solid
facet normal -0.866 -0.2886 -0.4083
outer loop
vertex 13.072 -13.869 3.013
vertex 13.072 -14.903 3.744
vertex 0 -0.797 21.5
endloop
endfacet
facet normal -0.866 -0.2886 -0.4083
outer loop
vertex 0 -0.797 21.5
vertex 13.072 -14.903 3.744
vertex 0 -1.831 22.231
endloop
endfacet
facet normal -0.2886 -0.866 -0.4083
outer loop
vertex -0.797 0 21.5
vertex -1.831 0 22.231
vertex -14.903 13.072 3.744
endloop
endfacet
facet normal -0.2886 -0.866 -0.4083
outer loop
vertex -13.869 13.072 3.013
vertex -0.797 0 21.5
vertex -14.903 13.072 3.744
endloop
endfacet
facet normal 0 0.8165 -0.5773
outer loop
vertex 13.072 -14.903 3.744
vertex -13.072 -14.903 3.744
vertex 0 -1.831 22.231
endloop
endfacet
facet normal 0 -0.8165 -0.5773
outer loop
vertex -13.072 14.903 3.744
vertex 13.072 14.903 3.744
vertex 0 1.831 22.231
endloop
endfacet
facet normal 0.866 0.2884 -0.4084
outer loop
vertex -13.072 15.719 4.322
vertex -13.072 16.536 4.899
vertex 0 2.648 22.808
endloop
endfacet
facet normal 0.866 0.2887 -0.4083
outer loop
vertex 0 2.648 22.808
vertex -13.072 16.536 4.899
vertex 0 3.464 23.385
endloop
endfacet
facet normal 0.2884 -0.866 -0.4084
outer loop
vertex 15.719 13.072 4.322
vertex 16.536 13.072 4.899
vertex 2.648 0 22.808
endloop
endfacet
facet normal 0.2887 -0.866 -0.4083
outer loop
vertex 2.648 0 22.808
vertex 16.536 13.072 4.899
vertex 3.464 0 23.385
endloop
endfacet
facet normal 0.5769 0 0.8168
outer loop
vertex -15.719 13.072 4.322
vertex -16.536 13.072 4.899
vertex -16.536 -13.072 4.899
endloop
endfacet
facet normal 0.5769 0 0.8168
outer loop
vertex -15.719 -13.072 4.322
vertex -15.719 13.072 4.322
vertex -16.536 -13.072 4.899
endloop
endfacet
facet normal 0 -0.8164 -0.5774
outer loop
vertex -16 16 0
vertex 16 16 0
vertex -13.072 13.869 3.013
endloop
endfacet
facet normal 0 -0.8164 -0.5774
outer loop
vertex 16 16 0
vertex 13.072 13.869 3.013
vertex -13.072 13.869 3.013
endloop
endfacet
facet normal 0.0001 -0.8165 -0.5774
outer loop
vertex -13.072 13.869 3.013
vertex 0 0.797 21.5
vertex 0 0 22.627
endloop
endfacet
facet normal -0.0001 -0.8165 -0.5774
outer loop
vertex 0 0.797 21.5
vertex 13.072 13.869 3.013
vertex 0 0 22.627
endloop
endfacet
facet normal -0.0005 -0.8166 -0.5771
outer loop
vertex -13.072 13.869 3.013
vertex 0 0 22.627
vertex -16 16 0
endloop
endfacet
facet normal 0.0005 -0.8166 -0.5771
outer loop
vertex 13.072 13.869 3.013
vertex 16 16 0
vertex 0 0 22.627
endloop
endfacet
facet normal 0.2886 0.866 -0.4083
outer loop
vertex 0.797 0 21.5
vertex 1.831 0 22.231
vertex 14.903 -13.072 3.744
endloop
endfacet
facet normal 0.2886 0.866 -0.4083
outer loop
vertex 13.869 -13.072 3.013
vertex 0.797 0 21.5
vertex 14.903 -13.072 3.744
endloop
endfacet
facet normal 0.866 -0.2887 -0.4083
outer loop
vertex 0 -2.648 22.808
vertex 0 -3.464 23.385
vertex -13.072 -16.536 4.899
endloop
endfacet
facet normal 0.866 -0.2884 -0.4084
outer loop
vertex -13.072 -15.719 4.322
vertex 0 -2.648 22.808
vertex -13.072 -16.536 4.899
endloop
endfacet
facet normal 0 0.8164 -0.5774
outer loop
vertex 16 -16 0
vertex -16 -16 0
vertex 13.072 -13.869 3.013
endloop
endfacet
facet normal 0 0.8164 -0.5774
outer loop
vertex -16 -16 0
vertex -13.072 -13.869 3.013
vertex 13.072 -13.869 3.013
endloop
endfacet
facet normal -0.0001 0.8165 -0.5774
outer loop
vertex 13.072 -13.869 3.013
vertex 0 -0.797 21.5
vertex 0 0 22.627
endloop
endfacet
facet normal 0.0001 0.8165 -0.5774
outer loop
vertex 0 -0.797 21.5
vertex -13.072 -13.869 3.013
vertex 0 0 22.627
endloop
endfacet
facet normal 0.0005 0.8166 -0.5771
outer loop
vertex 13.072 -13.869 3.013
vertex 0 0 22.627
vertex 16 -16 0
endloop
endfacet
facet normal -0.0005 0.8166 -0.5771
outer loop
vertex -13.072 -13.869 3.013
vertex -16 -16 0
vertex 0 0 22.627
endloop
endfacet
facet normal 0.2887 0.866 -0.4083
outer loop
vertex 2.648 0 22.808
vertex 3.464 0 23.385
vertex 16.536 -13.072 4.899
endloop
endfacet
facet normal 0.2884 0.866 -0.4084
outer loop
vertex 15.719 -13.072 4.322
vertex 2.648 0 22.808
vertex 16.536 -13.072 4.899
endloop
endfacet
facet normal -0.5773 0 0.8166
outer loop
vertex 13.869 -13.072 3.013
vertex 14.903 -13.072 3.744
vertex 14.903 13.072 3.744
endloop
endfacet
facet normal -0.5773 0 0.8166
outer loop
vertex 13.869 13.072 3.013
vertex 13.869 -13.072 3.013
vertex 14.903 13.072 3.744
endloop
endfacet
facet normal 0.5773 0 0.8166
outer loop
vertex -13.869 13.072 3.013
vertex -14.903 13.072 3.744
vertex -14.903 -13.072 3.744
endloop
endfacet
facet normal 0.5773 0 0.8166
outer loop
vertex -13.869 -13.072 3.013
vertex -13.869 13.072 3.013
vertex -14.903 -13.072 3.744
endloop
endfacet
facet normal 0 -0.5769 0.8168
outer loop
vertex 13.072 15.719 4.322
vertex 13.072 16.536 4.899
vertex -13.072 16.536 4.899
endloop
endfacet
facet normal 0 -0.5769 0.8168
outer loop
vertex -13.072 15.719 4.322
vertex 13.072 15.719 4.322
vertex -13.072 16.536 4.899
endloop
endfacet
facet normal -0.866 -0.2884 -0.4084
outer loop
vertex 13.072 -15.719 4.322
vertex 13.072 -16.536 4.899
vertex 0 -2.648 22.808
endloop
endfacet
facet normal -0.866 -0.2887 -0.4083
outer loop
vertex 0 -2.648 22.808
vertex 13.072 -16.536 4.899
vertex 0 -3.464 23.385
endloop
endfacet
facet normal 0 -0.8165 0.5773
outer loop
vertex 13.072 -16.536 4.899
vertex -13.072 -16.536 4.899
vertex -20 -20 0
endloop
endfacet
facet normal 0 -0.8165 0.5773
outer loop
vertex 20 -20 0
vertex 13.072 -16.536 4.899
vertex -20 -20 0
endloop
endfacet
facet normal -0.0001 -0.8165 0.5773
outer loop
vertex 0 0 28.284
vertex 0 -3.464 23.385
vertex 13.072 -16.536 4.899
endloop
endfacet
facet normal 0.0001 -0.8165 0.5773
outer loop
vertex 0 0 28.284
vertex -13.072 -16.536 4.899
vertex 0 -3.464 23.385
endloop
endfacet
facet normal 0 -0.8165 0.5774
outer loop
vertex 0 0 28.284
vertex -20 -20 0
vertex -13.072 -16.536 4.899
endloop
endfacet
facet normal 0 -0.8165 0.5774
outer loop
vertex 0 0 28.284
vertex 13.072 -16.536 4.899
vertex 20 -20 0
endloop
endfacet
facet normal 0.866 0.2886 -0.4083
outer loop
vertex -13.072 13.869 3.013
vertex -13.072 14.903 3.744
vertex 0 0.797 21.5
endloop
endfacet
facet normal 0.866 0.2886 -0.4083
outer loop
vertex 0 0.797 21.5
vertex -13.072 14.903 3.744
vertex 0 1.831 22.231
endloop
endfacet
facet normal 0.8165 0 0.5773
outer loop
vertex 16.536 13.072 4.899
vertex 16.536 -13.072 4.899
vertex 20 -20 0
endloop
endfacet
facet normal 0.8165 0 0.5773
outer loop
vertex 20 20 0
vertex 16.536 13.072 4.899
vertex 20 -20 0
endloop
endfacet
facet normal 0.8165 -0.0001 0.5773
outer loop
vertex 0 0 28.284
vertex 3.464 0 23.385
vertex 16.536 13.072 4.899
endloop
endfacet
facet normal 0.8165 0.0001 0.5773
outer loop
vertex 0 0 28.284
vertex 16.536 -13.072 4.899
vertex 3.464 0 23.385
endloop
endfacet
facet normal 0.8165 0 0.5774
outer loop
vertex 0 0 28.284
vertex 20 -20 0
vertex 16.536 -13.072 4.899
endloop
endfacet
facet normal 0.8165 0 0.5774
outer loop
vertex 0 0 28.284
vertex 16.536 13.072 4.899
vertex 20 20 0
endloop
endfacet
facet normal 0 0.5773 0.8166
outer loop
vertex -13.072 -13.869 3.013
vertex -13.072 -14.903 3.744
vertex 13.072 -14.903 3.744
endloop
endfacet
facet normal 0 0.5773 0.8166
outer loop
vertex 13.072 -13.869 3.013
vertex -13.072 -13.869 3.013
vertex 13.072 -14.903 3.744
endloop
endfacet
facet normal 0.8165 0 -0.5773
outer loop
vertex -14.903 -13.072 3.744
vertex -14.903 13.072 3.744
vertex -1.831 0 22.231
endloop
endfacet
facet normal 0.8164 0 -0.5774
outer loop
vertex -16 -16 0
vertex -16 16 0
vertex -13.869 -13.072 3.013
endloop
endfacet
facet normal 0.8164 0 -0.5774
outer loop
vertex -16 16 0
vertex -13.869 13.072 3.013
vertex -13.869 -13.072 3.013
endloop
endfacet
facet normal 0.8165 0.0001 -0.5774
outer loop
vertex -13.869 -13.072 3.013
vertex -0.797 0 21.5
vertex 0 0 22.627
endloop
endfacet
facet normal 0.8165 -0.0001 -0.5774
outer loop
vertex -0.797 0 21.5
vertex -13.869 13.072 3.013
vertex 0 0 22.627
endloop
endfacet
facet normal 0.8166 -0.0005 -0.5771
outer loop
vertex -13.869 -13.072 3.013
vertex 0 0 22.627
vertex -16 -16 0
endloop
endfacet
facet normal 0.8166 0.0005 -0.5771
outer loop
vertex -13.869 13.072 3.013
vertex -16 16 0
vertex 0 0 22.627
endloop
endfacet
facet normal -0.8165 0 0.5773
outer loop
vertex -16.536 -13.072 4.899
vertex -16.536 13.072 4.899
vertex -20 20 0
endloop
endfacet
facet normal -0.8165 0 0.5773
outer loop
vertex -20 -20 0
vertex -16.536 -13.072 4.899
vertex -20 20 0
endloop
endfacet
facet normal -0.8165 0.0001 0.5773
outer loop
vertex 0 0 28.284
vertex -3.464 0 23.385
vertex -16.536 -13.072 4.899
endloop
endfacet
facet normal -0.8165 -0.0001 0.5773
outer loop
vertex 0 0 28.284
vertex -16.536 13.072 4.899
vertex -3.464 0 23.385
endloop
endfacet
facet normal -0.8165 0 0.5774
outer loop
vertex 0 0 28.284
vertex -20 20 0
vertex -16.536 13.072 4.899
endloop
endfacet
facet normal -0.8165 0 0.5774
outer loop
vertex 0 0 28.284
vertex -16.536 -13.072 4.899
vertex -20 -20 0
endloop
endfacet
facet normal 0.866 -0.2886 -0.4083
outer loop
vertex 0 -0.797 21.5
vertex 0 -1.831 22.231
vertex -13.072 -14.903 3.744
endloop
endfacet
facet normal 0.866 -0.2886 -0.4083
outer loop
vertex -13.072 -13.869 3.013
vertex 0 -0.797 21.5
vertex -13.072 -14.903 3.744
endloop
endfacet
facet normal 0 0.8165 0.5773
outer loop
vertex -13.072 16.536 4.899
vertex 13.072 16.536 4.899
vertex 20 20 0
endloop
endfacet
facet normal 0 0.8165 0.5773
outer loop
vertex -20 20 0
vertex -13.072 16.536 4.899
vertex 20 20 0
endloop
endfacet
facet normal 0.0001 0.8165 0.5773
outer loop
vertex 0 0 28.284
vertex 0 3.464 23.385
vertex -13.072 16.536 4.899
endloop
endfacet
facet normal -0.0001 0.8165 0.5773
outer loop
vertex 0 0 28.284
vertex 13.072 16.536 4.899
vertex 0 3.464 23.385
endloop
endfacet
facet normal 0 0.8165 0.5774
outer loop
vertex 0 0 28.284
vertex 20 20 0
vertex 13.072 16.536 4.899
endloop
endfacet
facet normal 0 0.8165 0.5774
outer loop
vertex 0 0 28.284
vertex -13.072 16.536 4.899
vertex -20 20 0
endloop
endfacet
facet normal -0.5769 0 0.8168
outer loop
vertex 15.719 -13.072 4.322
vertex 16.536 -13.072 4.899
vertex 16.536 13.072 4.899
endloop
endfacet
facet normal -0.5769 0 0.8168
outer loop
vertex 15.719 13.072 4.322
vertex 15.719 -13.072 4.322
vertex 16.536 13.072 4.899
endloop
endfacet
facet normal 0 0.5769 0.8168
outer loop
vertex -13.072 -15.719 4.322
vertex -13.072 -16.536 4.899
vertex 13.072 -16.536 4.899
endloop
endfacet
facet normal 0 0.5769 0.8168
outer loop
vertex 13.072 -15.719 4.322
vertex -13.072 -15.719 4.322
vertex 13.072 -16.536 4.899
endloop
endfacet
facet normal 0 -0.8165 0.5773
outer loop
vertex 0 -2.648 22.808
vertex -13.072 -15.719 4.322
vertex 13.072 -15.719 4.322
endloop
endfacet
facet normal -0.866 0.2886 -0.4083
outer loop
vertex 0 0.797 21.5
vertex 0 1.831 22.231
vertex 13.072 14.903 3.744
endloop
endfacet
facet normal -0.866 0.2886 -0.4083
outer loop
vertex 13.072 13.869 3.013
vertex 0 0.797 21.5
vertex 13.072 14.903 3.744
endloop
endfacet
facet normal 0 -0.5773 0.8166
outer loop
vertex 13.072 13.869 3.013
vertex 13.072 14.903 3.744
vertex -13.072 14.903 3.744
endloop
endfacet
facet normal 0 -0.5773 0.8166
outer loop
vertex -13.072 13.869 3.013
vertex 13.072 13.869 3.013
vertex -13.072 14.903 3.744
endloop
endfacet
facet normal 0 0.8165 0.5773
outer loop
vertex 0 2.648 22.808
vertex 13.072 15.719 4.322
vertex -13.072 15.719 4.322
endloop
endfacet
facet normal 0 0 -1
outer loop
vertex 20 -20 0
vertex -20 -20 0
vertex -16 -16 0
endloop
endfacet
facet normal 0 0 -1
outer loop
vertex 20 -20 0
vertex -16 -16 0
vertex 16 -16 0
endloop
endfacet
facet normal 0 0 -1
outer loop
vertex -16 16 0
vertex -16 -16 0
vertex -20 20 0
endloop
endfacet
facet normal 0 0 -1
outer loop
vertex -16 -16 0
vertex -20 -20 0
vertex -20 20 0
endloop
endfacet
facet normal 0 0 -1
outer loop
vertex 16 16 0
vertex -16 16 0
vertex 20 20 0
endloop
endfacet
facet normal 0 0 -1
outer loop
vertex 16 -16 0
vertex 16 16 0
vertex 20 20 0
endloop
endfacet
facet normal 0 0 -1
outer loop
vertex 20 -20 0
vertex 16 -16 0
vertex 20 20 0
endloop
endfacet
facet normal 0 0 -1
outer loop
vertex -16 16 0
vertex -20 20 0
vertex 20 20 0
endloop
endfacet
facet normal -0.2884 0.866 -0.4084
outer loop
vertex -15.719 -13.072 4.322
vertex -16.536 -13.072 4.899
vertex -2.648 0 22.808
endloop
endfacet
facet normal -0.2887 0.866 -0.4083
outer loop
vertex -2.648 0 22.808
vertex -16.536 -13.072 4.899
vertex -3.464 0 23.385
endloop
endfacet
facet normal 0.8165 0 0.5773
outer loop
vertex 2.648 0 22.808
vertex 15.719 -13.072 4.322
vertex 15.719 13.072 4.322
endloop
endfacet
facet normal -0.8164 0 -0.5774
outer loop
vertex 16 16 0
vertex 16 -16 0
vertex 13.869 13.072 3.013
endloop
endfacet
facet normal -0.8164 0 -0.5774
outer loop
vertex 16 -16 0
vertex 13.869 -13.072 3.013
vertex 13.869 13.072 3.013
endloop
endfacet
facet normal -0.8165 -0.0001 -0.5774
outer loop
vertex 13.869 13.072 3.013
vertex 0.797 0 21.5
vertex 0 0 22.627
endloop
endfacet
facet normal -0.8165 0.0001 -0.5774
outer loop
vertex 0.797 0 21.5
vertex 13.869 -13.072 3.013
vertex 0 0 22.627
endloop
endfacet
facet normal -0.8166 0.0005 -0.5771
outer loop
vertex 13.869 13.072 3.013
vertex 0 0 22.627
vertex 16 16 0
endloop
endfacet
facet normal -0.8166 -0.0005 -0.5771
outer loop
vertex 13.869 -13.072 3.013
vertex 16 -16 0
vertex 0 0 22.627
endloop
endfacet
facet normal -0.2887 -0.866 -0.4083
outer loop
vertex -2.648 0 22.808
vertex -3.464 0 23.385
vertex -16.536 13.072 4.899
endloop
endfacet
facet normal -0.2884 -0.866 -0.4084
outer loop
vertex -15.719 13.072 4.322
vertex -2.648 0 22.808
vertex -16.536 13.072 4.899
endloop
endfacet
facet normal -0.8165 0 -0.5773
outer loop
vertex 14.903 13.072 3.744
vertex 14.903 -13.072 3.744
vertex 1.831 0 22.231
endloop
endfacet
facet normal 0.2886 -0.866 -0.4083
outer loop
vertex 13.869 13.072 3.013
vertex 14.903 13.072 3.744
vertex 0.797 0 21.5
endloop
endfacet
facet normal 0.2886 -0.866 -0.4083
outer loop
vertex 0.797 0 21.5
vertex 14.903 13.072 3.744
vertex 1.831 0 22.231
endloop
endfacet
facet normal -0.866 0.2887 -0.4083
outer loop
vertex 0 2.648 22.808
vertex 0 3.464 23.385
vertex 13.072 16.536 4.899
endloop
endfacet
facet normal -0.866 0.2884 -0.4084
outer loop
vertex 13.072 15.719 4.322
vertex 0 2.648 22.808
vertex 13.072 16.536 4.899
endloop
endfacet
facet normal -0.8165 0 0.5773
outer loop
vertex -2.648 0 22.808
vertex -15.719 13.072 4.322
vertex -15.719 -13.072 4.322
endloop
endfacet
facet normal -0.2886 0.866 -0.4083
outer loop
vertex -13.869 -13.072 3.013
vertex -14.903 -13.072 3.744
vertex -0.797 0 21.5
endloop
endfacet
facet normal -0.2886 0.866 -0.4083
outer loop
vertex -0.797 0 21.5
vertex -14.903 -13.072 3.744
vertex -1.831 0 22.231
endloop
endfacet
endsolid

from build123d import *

# Parameters (mm, degrees)
F2_W      = 40
F2_H      = 40
F7_W      = 32
F7_H      = 32
F13_DEPTH = 1
F14_START = -2
F14_DEPTH = 3
F16_DEPTH = 1
F17_START = -2
F17_DEPTH = 3
F19_DEPTH = 1
F20_START = -2
F20_DEPTH = 3
F22_DEPTH = 1
F23_START = -2
F23_DEPTH = 3


with BuildPart() as f5:
    # F2 (on Top) → F5 section 0
    with BuildSketch(Plane.XY, mode=Mode.PRIVATE) as f5_s0:
        Rectangle(F2_W, F2_H)
    loft([f5_s0.sketch, Vertex(0, 0, 28.2842712475)])

    # F7 (on Top) → F9 section 0
    with BuildSketch(Plane.XY, mode=Mode.PRIVATE) as f9_s0:
        Rectangle(F7_W, F7_H)
    loft([f9_s0.sketch, Vertex(0, 0, 22.627416998)], mode=Mode.SUBTRACT)

    # F12 (on offset) → F13 (cut)
    with BuildSketch(Plane(origin=(0, -13.3333333333, 9.4280904158), x_dir=(1, 0, 0), z_dir=(0, -0.8164965809, 0.5773502692))):
        Polygon((13.0717967697, -5.5470053838), (0, 17.0940107676), (-13.0717967697, -5.5470053838), align=None)
    extrude(amount=-F13_DEPTH, mode=Mode.SUBTRACT)

    # F12 (on offset) → F14 (cut)
    with BuildSketch(Plane(origin=(0, -13.3333333333, 9.4280904158), x_dir=(1, 0, 0), z_dir=(0, -0.8164965809, 0.5773502692)).offset(F14_START)):
        Polygon((13.0717967697, -5.5470053838), (0, 17.0940107676), (-13.0717967697, -5.5470053838), align=None)
    extrude(amount=-F14_DEPTH, mode=Mode.SUBTRACT)

    # F15 (on offset) → F16 (cut)
    with BuildSketch(Plane(origin=(-13.3333333333, 0, 9.4280904158), x_dir=(0, -1, 0), z_dir=(-0.8164965809, 0, 0.5773502692))):
        Polygon((13.0717967697, -5.5470053838), (0, 17.0940107676), (-13.0717967697, -5.5470053838), align=None)
    extrude(amount=-F16_DEPTH, mode=Mode.SUBTRACT)

    # F15 (on offset) → F17 (cut)
    with BuildSketch(Plane(origin=(-13.3333333333, 0, 9.4280904158), x_dir=(0, -1, 0), z_dir=(-0.8164965809, 0, 0.5773502692)).offset(F17_START)):
        Polygon((13.0717967697, -5.5470053838), (0, 17.0940107676), (-13.0717967697, -5.5470053838), align=None)
    extrude(amount=-F17_DEPTH, mode=Mode.SUBTRACT)

    # F18 (on face) → F19 (cut)
    with BuildSketch(Plane(origin=(0, 13.3333333333, 9.4280904158), x_dir=(-1, 0, 0), z_dir=(0, 0.8164965809, 0.5773502692))):
        Polygon((13.0717967697, -5.5470053838), (0, 17.0940107676), (-13.0717967697, -5.5470053838), align=None)
    extrude(amount=-F19_DEPTH, mode=Mode.SUBTRACT)

    # F18 (on face) → F20 (cut)
    with BuildSketch(Plane(origin=(0, 13.3333333333, 9.4280904158), x_dir=(-1, 0, 0), z_dir=(0, 0.8164965809, 0.5773502692)).offset(F20_START)):
        Polygon((13.0717967697, -5.5470053838), (0, 17.0940107676), (-13.0717967697, -5.5470053838), align=None)
    extrude(amount=-F20_DEPTH, mode=Mode.SUBTRACT)

    # F21 (on face) → F22 (cut)
    with BuildSketch(Plane(origin=(13.3333333333, 0, 9.4280904158), x_dir=(0, 1, 0), z_dir=(0.8164965809, 0, 0.5773502692))):
        Polygon((13.0717967697, -5.5470053838), (0, 17.0940107676), (-13.0717967697, -5.5470053838), align=None)
    extrude(amount=-F22_DEPTH, mode=Mode.SUBTRACT)

    # F21 (on face) → F23 (cut)
    with BuildSketch(Plane(origin=(13.3333333333, 0, 9.4280904158), x_dir=(0, 1, 0), z_dir=(0.8164965809, 0, 0.5773502692)).offset(F23_START)):
        Polygon((13.0717967697, -5.5470053838), (0, 17.0940107676), (-13.0717967697, -5.5470053838), align=None)
    extrude(amount=-F23_DEPTH, mode=Mode.SUBTRACT)


solid = f5.part
